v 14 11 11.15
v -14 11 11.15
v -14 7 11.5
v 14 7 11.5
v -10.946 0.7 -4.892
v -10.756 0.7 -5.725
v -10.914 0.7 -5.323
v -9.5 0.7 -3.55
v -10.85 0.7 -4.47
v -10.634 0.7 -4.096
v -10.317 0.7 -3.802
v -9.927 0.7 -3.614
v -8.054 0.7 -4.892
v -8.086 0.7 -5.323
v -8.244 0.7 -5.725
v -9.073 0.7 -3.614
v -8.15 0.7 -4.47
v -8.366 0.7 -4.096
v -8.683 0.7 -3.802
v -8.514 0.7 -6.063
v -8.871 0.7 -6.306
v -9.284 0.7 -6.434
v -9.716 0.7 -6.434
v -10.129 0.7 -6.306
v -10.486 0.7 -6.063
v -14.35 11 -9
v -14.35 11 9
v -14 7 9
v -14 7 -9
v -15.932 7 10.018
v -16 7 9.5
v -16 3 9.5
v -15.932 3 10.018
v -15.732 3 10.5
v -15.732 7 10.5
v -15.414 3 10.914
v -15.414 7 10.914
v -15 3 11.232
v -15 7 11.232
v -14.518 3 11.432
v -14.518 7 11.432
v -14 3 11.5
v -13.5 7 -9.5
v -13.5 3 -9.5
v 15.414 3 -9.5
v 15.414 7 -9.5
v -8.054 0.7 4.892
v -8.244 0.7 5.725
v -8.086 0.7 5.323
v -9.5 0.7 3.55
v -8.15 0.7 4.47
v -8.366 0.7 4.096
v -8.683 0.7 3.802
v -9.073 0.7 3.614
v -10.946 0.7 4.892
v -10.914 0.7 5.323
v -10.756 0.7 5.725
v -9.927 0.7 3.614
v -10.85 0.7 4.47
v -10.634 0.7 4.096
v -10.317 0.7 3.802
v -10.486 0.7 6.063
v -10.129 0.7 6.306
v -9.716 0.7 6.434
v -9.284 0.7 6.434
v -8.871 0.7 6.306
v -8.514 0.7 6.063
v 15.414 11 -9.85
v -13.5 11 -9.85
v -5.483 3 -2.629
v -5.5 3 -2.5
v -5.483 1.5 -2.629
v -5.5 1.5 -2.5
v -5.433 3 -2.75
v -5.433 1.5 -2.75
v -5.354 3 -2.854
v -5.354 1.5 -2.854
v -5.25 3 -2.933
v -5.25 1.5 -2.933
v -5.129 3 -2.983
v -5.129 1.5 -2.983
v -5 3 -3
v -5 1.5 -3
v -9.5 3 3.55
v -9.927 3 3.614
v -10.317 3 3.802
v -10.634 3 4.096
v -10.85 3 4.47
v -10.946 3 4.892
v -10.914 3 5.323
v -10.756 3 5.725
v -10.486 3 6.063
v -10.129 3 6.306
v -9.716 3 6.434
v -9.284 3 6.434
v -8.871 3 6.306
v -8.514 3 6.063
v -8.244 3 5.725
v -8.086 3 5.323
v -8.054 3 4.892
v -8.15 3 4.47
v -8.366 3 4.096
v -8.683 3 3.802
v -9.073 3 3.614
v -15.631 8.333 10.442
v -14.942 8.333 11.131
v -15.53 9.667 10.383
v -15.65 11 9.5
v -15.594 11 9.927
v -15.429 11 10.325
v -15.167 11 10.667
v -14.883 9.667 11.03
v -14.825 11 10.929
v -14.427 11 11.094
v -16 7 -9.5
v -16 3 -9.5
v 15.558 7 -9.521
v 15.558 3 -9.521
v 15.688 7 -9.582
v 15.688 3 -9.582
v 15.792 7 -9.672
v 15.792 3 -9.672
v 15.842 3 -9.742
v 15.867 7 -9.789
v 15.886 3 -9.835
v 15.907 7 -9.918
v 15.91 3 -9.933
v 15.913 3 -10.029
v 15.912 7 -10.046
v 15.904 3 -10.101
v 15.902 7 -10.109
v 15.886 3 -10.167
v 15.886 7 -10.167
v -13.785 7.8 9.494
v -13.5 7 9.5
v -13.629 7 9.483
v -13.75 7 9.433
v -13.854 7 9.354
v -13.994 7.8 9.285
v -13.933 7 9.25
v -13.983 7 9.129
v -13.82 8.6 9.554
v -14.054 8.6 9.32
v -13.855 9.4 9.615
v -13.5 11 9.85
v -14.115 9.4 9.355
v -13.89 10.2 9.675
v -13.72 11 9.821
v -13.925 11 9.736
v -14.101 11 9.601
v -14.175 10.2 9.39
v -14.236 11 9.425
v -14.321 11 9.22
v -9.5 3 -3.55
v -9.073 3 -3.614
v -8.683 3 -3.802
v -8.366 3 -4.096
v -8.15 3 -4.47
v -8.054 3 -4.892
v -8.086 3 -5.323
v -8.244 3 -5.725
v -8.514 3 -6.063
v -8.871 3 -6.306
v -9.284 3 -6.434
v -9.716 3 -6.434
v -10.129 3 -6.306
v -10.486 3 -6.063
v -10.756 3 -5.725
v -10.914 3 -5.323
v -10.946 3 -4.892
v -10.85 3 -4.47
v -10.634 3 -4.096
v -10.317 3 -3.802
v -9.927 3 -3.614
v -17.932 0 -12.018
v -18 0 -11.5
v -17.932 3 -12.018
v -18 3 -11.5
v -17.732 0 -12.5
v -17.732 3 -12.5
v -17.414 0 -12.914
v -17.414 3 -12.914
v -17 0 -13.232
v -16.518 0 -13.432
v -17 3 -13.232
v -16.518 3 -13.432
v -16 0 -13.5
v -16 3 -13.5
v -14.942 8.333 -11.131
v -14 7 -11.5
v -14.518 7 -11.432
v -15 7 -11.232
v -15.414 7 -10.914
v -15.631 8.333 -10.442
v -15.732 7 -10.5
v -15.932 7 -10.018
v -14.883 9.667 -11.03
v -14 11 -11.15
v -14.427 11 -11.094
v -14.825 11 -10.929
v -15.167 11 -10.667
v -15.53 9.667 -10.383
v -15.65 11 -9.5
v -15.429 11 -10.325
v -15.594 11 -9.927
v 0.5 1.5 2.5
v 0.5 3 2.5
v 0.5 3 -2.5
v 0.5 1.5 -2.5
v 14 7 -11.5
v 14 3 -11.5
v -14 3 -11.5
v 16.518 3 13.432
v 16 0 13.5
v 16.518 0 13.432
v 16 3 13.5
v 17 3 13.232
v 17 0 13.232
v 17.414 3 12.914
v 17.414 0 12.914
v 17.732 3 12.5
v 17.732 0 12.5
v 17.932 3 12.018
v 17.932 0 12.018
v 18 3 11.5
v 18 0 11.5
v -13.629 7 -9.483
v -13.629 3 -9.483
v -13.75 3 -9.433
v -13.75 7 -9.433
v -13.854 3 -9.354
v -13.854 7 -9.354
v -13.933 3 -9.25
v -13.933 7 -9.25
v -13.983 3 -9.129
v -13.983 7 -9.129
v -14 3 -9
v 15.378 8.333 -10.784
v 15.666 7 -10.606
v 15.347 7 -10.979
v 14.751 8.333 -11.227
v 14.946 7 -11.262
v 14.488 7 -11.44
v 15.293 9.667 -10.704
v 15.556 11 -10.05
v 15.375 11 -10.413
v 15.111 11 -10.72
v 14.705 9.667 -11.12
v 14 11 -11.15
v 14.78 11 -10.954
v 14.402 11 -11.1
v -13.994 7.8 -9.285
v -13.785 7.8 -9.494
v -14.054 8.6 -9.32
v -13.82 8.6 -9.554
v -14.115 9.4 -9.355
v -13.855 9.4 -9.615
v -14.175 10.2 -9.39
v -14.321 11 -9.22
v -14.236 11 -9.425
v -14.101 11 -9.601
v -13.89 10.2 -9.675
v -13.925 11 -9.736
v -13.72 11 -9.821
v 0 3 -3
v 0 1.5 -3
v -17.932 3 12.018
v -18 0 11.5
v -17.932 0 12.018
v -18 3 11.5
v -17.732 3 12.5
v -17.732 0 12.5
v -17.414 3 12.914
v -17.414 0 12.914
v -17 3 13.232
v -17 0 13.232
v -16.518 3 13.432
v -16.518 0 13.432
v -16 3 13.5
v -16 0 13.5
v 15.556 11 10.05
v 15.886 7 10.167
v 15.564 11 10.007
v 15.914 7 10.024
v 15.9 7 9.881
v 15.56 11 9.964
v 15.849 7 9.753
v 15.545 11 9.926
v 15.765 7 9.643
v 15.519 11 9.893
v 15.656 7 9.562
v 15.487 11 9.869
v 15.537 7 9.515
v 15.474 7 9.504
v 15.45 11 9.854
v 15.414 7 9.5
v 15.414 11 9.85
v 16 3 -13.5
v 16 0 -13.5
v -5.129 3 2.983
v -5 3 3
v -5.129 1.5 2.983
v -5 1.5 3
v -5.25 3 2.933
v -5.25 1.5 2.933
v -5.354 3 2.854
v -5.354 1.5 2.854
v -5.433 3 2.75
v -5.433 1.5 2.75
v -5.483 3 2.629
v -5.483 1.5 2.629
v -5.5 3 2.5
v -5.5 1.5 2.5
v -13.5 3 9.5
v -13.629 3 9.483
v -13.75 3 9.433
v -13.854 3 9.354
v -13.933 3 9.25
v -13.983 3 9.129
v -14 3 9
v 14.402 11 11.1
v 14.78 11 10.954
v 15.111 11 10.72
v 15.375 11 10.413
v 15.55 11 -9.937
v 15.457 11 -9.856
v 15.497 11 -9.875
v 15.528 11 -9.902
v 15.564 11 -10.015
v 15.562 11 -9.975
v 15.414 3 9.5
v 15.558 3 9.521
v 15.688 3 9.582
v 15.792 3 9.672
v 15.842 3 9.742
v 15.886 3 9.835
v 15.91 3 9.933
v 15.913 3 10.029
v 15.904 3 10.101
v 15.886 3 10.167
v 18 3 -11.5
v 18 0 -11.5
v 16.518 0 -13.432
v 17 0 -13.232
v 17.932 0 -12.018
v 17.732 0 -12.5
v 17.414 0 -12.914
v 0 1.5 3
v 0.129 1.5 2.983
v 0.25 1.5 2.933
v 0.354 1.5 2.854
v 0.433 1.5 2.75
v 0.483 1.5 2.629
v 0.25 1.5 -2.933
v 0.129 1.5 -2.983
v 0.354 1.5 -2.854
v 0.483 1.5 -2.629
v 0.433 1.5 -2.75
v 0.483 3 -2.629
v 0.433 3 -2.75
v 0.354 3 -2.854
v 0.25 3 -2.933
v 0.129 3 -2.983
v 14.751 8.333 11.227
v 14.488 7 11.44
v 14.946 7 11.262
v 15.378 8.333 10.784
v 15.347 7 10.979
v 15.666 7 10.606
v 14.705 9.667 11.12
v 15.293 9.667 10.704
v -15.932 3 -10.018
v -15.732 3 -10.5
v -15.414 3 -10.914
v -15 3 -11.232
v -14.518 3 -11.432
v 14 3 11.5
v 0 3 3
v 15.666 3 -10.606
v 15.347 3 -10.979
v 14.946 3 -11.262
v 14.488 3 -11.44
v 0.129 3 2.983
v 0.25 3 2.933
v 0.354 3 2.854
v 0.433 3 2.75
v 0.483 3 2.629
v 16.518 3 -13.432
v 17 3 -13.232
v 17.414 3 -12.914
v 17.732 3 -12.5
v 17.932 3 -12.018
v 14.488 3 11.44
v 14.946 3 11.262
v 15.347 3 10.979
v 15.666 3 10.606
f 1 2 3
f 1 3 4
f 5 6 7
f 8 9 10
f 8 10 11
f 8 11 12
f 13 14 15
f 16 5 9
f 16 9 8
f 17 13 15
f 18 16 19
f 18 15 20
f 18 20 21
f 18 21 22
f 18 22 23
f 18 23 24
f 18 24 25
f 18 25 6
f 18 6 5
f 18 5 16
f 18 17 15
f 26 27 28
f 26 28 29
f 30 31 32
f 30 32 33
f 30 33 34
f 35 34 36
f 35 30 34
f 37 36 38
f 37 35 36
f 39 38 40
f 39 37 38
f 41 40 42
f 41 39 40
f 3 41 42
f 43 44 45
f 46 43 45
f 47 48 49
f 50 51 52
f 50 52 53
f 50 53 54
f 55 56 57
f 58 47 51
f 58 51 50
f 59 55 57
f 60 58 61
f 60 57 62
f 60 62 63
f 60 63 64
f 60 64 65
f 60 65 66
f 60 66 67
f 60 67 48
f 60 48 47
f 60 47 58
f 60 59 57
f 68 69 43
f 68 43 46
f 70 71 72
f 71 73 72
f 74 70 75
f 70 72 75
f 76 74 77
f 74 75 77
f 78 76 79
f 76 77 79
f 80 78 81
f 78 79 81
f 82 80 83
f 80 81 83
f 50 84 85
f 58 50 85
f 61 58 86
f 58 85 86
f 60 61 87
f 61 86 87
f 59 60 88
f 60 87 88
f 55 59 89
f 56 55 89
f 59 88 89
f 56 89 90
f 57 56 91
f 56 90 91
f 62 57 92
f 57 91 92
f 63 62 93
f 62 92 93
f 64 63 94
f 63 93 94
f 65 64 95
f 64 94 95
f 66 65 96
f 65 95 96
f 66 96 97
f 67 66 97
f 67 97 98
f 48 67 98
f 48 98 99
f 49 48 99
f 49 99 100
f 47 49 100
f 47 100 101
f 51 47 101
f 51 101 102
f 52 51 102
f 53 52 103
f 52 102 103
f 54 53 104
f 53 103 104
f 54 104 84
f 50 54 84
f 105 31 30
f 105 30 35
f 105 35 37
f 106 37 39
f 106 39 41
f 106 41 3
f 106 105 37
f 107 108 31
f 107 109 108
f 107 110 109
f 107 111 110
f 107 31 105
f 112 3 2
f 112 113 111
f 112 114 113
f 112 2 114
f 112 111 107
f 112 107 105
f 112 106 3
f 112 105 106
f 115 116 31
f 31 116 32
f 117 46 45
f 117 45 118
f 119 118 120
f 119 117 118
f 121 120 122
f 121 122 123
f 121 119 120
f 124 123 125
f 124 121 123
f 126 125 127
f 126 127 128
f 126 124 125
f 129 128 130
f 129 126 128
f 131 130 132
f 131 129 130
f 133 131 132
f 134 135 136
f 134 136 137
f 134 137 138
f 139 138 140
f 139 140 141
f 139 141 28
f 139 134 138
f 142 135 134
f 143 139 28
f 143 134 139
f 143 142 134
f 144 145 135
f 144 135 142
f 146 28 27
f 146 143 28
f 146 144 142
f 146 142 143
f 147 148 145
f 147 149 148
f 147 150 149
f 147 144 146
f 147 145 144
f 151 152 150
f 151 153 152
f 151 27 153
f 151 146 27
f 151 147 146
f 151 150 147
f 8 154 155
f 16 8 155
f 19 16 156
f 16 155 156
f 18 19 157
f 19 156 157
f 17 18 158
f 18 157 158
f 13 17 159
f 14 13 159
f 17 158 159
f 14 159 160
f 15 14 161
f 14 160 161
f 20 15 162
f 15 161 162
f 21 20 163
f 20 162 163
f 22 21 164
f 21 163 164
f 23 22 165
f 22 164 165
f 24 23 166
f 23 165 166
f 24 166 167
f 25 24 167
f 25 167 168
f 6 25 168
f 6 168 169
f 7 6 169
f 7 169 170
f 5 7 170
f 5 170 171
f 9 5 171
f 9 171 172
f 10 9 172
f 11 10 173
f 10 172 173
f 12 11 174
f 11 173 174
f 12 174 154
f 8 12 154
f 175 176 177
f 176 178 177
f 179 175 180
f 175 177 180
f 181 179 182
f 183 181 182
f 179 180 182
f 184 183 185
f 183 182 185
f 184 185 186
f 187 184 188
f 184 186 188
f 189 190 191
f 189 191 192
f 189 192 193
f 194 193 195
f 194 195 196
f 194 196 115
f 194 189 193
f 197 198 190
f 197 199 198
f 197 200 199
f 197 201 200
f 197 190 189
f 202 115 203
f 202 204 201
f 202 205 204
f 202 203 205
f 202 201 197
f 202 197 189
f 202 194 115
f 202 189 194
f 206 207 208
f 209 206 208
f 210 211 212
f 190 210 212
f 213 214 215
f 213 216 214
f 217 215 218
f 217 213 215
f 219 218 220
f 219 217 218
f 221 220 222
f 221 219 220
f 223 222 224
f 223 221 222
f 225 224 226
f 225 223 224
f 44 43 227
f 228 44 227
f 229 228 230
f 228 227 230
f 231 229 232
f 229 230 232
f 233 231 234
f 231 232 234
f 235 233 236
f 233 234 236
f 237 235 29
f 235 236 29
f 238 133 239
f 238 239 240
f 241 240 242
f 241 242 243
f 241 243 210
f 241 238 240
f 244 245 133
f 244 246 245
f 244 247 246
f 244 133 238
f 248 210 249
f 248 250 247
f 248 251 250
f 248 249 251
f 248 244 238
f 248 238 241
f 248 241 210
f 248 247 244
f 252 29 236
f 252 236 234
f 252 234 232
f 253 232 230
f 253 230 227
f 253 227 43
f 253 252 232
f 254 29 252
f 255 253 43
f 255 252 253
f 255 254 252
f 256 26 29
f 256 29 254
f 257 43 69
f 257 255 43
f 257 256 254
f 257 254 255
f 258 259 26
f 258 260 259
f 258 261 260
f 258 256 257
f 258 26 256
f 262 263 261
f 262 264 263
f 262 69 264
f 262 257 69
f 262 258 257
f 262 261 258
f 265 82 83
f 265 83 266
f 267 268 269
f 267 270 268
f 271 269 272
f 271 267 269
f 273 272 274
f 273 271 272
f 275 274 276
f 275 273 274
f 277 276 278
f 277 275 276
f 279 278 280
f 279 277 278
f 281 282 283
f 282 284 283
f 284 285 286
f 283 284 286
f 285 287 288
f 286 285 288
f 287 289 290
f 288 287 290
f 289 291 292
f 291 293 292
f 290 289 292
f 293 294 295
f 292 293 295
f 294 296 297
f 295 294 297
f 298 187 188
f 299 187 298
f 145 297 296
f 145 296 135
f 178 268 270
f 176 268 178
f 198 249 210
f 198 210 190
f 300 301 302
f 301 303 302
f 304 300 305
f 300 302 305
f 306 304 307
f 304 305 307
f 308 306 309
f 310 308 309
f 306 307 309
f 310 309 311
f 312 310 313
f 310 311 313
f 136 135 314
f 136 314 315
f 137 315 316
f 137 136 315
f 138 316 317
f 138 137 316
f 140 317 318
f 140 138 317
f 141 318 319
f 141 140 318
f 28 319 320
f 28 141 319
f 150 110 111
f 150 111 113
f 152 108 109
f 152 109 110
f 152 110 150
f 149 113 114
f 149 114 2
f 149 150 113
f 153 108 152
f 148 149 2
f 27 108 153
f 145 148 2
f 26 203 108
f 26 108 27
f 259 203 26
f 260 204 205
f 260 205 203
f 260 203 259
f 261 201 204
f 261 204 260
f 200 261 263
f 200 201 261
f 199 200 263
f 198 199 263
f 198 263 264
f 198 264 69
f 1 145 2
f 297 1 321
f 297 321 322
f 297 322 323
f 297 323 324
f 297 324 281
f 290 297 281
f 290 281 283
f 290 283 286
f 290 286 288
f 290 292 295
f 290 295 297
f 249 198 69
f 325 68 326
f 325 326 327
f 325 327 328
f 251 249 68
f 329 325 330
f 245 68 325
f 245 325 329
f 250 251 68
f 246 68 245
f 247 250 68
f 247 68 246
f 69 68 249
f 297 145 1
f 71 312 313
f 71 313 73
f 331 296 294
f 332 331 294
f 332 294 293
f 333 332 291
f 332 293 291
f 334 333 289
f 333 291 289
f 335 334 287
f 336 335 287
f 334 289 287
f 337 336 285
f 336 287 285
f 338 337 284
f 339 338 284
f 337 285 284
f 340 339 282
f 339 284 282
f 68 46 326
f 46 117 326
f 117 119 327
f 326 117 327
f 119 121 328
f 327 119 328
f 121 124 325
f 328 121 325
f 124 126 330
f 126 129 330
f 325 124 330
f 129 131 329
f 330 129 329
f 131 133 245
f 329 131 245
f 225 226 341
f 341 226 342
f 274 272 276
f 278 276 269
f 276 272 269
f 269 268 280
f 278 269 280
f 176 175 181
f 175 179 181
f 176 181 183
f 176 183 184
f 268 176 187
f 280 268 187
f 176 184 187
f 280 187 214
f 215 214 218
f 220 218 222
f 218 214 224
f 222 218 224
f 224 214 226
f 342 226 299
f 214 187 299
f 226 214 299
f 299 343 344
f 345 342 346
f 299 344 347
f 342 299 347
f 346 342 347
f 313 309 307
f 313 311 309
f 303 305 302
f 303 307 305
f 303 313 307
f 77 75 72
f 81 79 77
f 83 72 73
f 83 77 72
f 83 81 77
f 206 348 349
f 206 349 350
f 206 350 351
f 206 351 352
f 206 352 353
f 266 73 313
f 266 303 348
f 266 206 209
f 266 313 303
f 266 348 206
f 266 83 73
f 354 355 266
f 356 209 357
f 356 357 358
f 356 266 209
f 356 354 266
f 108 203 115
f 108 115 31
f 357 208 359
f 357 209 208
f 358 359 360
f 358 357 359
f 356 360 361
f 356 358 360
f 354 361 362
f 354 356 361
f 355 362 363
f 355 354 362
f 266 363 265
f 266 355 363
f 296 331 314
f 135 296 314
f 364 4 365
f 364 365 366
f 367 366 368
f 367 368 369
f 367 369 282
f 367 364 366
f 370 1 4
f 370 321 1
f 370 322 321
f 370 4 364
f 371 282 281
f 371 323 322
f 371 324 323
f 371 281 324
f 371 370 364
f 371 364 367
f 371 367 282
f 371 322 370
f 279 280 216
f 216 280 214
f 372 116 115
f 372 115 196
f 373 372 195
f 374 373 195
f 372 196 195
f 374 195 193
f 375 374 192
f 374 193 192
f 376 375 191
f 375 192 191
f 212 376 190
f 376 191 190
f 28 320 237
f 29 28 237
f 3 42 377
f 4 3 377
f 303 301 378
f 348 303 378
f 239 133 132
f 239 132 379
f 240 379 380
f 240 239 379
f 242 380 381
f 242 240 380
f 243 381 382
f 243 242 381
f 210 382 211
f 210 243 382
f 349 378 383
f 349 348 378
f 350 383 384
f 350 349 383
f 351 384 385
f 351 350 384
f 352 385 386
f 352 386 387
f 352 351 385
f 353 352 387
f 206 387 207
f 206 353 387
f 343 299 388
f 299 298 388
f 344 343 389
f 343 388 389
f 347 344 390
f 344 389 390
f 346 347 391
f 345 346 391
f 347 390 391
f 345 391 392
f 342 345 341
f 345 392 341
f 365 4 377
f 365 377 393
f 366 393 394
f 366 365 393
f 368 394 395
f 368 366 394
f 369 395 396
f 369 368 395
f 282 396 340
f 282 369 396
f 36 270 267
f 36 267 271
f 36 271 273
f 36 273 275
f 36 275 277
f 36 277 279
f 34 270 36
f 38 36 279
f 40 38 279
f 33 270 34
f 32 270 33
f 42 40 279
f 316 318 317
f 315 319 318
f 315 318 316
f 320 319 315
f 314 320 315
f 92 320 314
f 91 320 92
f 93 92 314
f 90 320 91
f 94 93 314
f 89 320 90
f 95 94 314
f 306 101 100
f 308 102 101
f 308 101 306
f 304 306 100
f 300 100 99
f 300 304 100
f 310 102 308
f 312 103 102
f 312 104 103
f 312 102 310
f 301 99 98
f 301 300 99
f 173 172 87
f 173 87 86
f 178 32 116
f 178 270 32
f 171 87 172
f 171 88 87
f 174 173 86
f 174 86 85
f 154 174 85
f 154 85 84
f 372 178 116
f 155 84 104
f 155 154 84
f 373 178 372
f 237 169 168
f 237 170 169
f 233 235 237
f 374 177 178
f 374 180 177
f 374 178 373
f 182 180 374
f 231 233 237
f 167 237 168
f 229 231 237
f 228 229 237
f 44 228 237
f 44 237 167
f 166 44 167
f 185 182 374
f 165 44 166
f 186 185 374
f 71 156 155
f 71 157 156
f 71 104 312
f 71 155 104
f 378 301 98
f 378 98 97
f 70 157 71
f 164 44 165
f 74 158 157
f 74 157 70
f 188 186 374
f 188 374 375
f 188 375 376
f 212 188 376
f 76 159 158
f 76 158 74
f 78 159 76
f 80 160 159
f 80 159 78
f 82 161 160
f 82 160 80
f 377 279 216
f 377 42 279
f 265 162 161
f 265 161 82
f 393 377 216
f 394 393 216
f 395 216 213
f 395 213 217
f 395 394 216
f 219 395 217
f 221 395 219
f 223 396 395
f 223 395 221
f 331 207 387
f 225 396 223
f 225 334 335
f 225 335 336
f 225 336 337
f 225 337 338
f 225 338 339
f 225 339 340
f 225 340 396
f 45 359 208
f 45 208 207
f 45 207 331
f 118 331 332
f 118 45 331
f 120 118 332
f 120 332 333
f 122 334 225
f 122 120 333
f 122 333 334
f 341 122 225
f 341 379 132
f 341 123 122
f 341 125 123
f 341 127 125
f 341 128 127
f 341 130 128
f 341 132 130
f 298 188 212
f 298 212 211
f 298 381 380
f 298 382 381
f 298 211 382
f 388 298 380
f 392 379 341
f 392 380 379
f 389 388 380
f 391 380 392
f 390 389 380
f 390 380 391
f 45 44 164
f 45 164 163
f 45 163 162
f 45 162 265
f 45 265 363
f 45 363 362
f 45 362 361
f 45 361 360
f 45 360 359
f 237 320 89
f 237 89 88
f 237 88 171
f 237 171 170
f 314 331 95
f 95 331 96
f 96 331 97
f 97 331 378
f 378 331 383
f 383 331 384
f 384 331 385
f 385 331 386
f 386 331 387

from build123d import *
from OCP.BRepFilletAPI import BRepFilletAPI_MakeChamfer

# Parameters (mm, degrees)
SKETCH1_W           = 36
SKETCH1_H           = 27
BOSS_EXTRUDE1_DEPTH = 3
SKETCH2_W           = 6
SKETCH2_H           = 6
CUT_EXTRUDE1_DEPTH  = 1.5
SKETCH3_R           = 1.45
CUT_EXTRUDE2_DEPTH  = 2.3
BOSS_EXTRUDE3_DEPTH = 8
FILLET1_R           = 2
FILLET2_R           = 0.5
FILLET3_R           = 0.5
CHAMFER2_SIZE       = 4
CHAMFER2_SIZE2      = 0.349954654


with BuildPart() as part:
    # Sketch1 → Boss-Extrude1 (new body)
    with BuildSketch(Plane(origin=(0, 0, 0), x_dir=(1, 0, 0), z_dir=(0, 1, 0))):
        Rectangle(SKETCH1_W, SKETCH1_H)
    extrude(amount=BOSS_EXTRUDE1_DEPTH)

    # Sketch2 → Cut-Extrude1 (cut)
    with BuildSketch(Plane(origin=(0, 3, 0), x_dir=(1, 0, 0), z_dir=(0, 1, 0))):
        with Locations((-2.5, 0)):
            Rectangle(SKETCH2_W, SKETCH2_H)
    extrude(amount=-CUT_EXTRUDE1_DEPTH, mode=Mode.SUBTRACT)

    # Sketch3 → Cut-Extrude2 (cut)
    with BuildSketch(Plane(origin=(0, 3, 0), x_dir=(1, 0, 0), z_dir=(0, 1, 0))):
        with Locations(Location((-9.5, 5, 0), (0, 0, 270))):
            Circle(SKETCH3_R)
        with Locations(Location((-9.5, -5, 0), (0, 0, 90))):
            Circle(SKETCH3_R)
    extrude(amount=-CUT_EXTRUDE2_DEPTH, mode=Mode.SUBTRACT)

    # Sketch4 → Boss-Extrude3 (add)
    with BuildSketch(Plane(origin=(0, 3, 0), x_dir=(1, 0, 0), z_dir=(0, 1, 0))):
        Polygon((-16, 11.5), (-16, -11.5), (16, -11.5), (16, -9.5), (-14, -9.5), (-14, 9.5), (16, 9.5), (16, 11.5), align=None)
    extrude(amount=BOSS_EXTRUDE3_DEPTH)

    # Fillet1
    fillet1_edges = [part.edges().sort_by_distance(p)[0] for p in [
        (-16, 7, -11.5),
        (16, 7, -11.5),
        (16, 7, 11.5),
        (-16, 7, 11.5),
        (-18, 1.5, 13.5),
        (18, 1.5, 13.5),
        (-18, 1.5, -13.5),
        (18, 1.5, -13.5),
    ]]
    fillet(fillet1_edges, radius=FILLET1_R - 0.0001)  # a hair under: the kernel refuses the full size

    # Fillet2
    fillet2_edges = [part.edges().sort_by_distance(p)[0] for p in [
        (-14, 7, 9.5),
        (-14, 7, -9.5),
    ]]
    fillet(fillet2_edges, radius=FILLET2_R)

    # Fillet3
    fillet3_edges = [part.edges().sort_by_distance(p)[0] for p in [
        (0.5, 2.25, -3),
        (0.5, 2.25, 3),
        (-5.5, 2.25, 3),
        (-5.5, 2.25, -3),
        (16, 7, 9.5),
        (16, 7, -9.5),
    ]]
    fillet(fillet3_edges, radius=FILLET3_R)

    # Chamfer2: one chamfer whose edges measure the first distance from different faces: ONE call of the kernel's chamfer builder (chamfer() names one face for all edges)
    chamfer2_edges_1 = [part.edges().sort_by_distance(p)[0] for p in [
        (0.957121425, 11, -9.5),
    ]]
    chamfer2_side_1 = [part.faces().sort_by_distance(p)[0] for p in [
        (0.957121425, 7, -9.5),
    ]]
    chamfer2_edges_2 = [part.edges().sort_by_distance(p)[0] for p in [
        (-14, 11, 0),
    ]]
    chamfer2_side_2 = [part.faces().sort_by_distance(p)[0] for p in [
        (-14, 7, 0),
    ]]
    chamfer2_edges_3 = [part.edges().sort_by_distance(p)[0] for p in [
        (-13.853553391, 11, -9.353553391),
    ]]
    chamfer2_side_3 = [part.faces().sort_by_distance(p)[0] for p in [
        (-13.853553391, 7, -9.353553391),
    ]]
    chamfer2_edges_4 = [part.edges().sort_by_distance(p)[0] for p in [
        (-13.853553391, 11, 9.353553391),
    ]]
    chamfer2_side_4 = [part.faces().sort_by_distance(p)[0] for p in [
        (-13.853553391, 7, 9.353553391),
    ]]
    chamfer2_edges_5 = [part.edges().sort_by_distance(p)[0] for p in [
        (15.154781293, 11, -11.132984295),
    ]]
    chamfer2_side_5 = [part.faces().sort_by_distance(p)[0] for p in [
        (15.154781293, 7, -11.132984295),
    ]]
    chamfer2_edges_6 = [part.edges().sort_by_distance(p)[0] for p in [
        (0.957121425, 11, 9.5),
    ]]
    chamfer2_side_6 = [part.faces().sort_by_distance(p)[0] for p in [
        (0.957121425, 7, 9.5),
    ]]
    chamfer2_edges_7 = [part.edges().sort_by_distance(p)[0] for p in [
        (15.822484336, 11, 9.711315242),
    ]]
    chamfer2_side_7 = [part.faces().sort_by_distance(p)[0] for p in [
        (15.822484336, 7, 9.711315242),
    ]]
    chamfer2_edges_8 = [part.edges().sort_by_distance(p)[0] for p in [
        (15.822484336, 11, -9.711315242),
    ]]
    chamfer2_side_8 = [part.faces().sort_by_distance(p)[0] for p in [
        (15.822484336, 7, -9.711315242),
    ]]
    chamfer2_edges_9 = [part.edges().sort_by_distance(p)[0] for p in [
        (-16, 11, 0),
    ]]
    chamfer2_side_9 = [part.faces().sort_by_distance(p)[0] for p in [
        (-16, 7, 0),
    ]]
    chamfer2_edges_10 = [part.edges().sort_by_distance(p)[0] for p in [
        (0, 11, -11.5),
    ]]
    chamfer2_side_10 = [part.faces().sort_by_distance(p)[0] for p in [
        (0, 7, -11.5),
    ]]
    chamfer2_edges_11 = [part.edges().sort_by_distance(p)[0] for p in [
        (0, 11, 11.5),
    ]]
    chamfer2_side_11 = [part.faces().sort_by_distance(p)[0] for p in [
        (0, 7, 11.5),
    ]]
    chamfer2_edges_12 = [part.edges().sort_by_distance(p)[0] for p in [
        (-15.414242852, 11, 10.914242852),
    ]]
    chamfer2_side_12 = [part.faces().sort_by_distance(p)[0] for p in [
        (-15.414242852, 7, 10.914242852),
    ]]
    chamfer2_edges_13 = [part.edges().sort_by_distance(p)[0] for p in [
        (15.154781293, 11, 11.132984295),
    ]]
    chamfer2_side_13 = [part.faces().sort_by_distance(p)[0] for p in [
        (15.154781293, 7, 11.132984295),
    ]]
    chamfer2_edges_14 = [part.edges().sort_by_distance(p)[0] for p in [
        (-15.414242852, 11, -10.914242852),
    ]]
    chamfer2_side_14 = [part.faces().sort_by_distance(p)[0] for p in [
        (-15.414242852, 7, -10.914242852),
    ]]
    chamfer2 = BRepFilletAPI_MakeChamfer(part.part.solid().wrapped)
    for e in chamfer2_edges_1:
        chamfer2.Add(CHAMFER2_SIZE, CHAMFER2_SIZE2, e.wrapped, chamfer2_side_1[0].wrapped)  # the first distance lies on this face
    for e in chamfer2_edges_2:
        chamfer2.Add(CHAMFER2_SIZE, CHAMFER2_SIZE2, e.wrapped, chamfer2_side_2[0].wrapped)  # the first distance lies on this face
    for e in chamfer2_edges_3:
        chamfer2.Add(CHAMFER2_SIZE, CHAMFER2_SIZE2, e.wrapped, chamfer2_side_3[0].wrapped)  # the first distance lies on this face
    for e in chamfer2_edges_4:
        chamfer2.Add(CHAMFER2_SIZE, CHAMFER2_SIZE2, e.wrapped, chamfer2_side_4[0].wrapped)  # the first distance lies on this face
    for e in chamfer2_edges_5:
        chamfer2.Add(CHAMFER2_SIZE, CHAMFER2_SIZE2, e.wrapped, chamfer2_side_5[0].wrapped)  # the first distance lies on this face
    for e in chamfer2_edges_6:
        chamfer2.Add(CHAMFER2_SIZE, CHAMFER2_SIZE2, e.wrapped, chamfer2_side_6[0].wrapped)  # the first distance lies on this face
    for e in chamfer2_edges_7:
        chamfer2.Add(CHAMFER2_SIZE, CHAMFER2_SIZE2, e.wrapped, chamfer2_side_7[0].wrapped)  # the first distance lies on this face
    for e in chamfer2_edges_8:
        chamfer2.Add(CHAMFER2_SIZE, CHAMFER2_SIZE2, e.wrapped, chamfer2_side_8[0].wrapped)  # the first distance lies on this face
    for e in chamfer2_edges_9:
        chamfer2.Add(CHAMFER2_SIZE, CHAMFER2_SIZE2, e.wrapped, chamfer2_side_9[0].wrapped)  # the first distance lies on this face
    for e in chamfer2_edges_10:
        chamfer2.Add(CHAMFER2_SIZE, CHAMFER2_SIZE2, e.wrapped, chamfer2_side_10[0].wrapped)  # the first distance lies on this face
    for e in chamfer2_edges_11:
        chamfer2.Add(CHAMFER2_SIZE, CHAMFER2_SIZE2, e.wrapped, chamfer2_side_11[0].wrapped)  # the first distance lies on this face
    for e in chamfer2_edges_12:
        chamfer2.Add(CHAMFER2_SIZE, CHAMFER2_SIZE2, e.wrapped, chamfer2_side_12[0].wrapped)  # the first distance lies on this face
    for e in chamfer2_edges_13:
        chamfer2.Add(CHAMFER2_SIZE, CHAMFER2_SIZE2, e.wrapped, chamfer2_side_13[0].wrapped)  # the first distance lies on this face
    for e in chamfer2_edges_14:
        chamfer2.Add(CHAMFER2_SIZE, CHAMFER2_SIZE2, e.wrapped, chamfer2_side_14[0].wrapped)  # the first distance lies on this face
    add(Compound.cast(chamfer2.Shape()), mode=Mode.REPLACE)


solid = part.part
